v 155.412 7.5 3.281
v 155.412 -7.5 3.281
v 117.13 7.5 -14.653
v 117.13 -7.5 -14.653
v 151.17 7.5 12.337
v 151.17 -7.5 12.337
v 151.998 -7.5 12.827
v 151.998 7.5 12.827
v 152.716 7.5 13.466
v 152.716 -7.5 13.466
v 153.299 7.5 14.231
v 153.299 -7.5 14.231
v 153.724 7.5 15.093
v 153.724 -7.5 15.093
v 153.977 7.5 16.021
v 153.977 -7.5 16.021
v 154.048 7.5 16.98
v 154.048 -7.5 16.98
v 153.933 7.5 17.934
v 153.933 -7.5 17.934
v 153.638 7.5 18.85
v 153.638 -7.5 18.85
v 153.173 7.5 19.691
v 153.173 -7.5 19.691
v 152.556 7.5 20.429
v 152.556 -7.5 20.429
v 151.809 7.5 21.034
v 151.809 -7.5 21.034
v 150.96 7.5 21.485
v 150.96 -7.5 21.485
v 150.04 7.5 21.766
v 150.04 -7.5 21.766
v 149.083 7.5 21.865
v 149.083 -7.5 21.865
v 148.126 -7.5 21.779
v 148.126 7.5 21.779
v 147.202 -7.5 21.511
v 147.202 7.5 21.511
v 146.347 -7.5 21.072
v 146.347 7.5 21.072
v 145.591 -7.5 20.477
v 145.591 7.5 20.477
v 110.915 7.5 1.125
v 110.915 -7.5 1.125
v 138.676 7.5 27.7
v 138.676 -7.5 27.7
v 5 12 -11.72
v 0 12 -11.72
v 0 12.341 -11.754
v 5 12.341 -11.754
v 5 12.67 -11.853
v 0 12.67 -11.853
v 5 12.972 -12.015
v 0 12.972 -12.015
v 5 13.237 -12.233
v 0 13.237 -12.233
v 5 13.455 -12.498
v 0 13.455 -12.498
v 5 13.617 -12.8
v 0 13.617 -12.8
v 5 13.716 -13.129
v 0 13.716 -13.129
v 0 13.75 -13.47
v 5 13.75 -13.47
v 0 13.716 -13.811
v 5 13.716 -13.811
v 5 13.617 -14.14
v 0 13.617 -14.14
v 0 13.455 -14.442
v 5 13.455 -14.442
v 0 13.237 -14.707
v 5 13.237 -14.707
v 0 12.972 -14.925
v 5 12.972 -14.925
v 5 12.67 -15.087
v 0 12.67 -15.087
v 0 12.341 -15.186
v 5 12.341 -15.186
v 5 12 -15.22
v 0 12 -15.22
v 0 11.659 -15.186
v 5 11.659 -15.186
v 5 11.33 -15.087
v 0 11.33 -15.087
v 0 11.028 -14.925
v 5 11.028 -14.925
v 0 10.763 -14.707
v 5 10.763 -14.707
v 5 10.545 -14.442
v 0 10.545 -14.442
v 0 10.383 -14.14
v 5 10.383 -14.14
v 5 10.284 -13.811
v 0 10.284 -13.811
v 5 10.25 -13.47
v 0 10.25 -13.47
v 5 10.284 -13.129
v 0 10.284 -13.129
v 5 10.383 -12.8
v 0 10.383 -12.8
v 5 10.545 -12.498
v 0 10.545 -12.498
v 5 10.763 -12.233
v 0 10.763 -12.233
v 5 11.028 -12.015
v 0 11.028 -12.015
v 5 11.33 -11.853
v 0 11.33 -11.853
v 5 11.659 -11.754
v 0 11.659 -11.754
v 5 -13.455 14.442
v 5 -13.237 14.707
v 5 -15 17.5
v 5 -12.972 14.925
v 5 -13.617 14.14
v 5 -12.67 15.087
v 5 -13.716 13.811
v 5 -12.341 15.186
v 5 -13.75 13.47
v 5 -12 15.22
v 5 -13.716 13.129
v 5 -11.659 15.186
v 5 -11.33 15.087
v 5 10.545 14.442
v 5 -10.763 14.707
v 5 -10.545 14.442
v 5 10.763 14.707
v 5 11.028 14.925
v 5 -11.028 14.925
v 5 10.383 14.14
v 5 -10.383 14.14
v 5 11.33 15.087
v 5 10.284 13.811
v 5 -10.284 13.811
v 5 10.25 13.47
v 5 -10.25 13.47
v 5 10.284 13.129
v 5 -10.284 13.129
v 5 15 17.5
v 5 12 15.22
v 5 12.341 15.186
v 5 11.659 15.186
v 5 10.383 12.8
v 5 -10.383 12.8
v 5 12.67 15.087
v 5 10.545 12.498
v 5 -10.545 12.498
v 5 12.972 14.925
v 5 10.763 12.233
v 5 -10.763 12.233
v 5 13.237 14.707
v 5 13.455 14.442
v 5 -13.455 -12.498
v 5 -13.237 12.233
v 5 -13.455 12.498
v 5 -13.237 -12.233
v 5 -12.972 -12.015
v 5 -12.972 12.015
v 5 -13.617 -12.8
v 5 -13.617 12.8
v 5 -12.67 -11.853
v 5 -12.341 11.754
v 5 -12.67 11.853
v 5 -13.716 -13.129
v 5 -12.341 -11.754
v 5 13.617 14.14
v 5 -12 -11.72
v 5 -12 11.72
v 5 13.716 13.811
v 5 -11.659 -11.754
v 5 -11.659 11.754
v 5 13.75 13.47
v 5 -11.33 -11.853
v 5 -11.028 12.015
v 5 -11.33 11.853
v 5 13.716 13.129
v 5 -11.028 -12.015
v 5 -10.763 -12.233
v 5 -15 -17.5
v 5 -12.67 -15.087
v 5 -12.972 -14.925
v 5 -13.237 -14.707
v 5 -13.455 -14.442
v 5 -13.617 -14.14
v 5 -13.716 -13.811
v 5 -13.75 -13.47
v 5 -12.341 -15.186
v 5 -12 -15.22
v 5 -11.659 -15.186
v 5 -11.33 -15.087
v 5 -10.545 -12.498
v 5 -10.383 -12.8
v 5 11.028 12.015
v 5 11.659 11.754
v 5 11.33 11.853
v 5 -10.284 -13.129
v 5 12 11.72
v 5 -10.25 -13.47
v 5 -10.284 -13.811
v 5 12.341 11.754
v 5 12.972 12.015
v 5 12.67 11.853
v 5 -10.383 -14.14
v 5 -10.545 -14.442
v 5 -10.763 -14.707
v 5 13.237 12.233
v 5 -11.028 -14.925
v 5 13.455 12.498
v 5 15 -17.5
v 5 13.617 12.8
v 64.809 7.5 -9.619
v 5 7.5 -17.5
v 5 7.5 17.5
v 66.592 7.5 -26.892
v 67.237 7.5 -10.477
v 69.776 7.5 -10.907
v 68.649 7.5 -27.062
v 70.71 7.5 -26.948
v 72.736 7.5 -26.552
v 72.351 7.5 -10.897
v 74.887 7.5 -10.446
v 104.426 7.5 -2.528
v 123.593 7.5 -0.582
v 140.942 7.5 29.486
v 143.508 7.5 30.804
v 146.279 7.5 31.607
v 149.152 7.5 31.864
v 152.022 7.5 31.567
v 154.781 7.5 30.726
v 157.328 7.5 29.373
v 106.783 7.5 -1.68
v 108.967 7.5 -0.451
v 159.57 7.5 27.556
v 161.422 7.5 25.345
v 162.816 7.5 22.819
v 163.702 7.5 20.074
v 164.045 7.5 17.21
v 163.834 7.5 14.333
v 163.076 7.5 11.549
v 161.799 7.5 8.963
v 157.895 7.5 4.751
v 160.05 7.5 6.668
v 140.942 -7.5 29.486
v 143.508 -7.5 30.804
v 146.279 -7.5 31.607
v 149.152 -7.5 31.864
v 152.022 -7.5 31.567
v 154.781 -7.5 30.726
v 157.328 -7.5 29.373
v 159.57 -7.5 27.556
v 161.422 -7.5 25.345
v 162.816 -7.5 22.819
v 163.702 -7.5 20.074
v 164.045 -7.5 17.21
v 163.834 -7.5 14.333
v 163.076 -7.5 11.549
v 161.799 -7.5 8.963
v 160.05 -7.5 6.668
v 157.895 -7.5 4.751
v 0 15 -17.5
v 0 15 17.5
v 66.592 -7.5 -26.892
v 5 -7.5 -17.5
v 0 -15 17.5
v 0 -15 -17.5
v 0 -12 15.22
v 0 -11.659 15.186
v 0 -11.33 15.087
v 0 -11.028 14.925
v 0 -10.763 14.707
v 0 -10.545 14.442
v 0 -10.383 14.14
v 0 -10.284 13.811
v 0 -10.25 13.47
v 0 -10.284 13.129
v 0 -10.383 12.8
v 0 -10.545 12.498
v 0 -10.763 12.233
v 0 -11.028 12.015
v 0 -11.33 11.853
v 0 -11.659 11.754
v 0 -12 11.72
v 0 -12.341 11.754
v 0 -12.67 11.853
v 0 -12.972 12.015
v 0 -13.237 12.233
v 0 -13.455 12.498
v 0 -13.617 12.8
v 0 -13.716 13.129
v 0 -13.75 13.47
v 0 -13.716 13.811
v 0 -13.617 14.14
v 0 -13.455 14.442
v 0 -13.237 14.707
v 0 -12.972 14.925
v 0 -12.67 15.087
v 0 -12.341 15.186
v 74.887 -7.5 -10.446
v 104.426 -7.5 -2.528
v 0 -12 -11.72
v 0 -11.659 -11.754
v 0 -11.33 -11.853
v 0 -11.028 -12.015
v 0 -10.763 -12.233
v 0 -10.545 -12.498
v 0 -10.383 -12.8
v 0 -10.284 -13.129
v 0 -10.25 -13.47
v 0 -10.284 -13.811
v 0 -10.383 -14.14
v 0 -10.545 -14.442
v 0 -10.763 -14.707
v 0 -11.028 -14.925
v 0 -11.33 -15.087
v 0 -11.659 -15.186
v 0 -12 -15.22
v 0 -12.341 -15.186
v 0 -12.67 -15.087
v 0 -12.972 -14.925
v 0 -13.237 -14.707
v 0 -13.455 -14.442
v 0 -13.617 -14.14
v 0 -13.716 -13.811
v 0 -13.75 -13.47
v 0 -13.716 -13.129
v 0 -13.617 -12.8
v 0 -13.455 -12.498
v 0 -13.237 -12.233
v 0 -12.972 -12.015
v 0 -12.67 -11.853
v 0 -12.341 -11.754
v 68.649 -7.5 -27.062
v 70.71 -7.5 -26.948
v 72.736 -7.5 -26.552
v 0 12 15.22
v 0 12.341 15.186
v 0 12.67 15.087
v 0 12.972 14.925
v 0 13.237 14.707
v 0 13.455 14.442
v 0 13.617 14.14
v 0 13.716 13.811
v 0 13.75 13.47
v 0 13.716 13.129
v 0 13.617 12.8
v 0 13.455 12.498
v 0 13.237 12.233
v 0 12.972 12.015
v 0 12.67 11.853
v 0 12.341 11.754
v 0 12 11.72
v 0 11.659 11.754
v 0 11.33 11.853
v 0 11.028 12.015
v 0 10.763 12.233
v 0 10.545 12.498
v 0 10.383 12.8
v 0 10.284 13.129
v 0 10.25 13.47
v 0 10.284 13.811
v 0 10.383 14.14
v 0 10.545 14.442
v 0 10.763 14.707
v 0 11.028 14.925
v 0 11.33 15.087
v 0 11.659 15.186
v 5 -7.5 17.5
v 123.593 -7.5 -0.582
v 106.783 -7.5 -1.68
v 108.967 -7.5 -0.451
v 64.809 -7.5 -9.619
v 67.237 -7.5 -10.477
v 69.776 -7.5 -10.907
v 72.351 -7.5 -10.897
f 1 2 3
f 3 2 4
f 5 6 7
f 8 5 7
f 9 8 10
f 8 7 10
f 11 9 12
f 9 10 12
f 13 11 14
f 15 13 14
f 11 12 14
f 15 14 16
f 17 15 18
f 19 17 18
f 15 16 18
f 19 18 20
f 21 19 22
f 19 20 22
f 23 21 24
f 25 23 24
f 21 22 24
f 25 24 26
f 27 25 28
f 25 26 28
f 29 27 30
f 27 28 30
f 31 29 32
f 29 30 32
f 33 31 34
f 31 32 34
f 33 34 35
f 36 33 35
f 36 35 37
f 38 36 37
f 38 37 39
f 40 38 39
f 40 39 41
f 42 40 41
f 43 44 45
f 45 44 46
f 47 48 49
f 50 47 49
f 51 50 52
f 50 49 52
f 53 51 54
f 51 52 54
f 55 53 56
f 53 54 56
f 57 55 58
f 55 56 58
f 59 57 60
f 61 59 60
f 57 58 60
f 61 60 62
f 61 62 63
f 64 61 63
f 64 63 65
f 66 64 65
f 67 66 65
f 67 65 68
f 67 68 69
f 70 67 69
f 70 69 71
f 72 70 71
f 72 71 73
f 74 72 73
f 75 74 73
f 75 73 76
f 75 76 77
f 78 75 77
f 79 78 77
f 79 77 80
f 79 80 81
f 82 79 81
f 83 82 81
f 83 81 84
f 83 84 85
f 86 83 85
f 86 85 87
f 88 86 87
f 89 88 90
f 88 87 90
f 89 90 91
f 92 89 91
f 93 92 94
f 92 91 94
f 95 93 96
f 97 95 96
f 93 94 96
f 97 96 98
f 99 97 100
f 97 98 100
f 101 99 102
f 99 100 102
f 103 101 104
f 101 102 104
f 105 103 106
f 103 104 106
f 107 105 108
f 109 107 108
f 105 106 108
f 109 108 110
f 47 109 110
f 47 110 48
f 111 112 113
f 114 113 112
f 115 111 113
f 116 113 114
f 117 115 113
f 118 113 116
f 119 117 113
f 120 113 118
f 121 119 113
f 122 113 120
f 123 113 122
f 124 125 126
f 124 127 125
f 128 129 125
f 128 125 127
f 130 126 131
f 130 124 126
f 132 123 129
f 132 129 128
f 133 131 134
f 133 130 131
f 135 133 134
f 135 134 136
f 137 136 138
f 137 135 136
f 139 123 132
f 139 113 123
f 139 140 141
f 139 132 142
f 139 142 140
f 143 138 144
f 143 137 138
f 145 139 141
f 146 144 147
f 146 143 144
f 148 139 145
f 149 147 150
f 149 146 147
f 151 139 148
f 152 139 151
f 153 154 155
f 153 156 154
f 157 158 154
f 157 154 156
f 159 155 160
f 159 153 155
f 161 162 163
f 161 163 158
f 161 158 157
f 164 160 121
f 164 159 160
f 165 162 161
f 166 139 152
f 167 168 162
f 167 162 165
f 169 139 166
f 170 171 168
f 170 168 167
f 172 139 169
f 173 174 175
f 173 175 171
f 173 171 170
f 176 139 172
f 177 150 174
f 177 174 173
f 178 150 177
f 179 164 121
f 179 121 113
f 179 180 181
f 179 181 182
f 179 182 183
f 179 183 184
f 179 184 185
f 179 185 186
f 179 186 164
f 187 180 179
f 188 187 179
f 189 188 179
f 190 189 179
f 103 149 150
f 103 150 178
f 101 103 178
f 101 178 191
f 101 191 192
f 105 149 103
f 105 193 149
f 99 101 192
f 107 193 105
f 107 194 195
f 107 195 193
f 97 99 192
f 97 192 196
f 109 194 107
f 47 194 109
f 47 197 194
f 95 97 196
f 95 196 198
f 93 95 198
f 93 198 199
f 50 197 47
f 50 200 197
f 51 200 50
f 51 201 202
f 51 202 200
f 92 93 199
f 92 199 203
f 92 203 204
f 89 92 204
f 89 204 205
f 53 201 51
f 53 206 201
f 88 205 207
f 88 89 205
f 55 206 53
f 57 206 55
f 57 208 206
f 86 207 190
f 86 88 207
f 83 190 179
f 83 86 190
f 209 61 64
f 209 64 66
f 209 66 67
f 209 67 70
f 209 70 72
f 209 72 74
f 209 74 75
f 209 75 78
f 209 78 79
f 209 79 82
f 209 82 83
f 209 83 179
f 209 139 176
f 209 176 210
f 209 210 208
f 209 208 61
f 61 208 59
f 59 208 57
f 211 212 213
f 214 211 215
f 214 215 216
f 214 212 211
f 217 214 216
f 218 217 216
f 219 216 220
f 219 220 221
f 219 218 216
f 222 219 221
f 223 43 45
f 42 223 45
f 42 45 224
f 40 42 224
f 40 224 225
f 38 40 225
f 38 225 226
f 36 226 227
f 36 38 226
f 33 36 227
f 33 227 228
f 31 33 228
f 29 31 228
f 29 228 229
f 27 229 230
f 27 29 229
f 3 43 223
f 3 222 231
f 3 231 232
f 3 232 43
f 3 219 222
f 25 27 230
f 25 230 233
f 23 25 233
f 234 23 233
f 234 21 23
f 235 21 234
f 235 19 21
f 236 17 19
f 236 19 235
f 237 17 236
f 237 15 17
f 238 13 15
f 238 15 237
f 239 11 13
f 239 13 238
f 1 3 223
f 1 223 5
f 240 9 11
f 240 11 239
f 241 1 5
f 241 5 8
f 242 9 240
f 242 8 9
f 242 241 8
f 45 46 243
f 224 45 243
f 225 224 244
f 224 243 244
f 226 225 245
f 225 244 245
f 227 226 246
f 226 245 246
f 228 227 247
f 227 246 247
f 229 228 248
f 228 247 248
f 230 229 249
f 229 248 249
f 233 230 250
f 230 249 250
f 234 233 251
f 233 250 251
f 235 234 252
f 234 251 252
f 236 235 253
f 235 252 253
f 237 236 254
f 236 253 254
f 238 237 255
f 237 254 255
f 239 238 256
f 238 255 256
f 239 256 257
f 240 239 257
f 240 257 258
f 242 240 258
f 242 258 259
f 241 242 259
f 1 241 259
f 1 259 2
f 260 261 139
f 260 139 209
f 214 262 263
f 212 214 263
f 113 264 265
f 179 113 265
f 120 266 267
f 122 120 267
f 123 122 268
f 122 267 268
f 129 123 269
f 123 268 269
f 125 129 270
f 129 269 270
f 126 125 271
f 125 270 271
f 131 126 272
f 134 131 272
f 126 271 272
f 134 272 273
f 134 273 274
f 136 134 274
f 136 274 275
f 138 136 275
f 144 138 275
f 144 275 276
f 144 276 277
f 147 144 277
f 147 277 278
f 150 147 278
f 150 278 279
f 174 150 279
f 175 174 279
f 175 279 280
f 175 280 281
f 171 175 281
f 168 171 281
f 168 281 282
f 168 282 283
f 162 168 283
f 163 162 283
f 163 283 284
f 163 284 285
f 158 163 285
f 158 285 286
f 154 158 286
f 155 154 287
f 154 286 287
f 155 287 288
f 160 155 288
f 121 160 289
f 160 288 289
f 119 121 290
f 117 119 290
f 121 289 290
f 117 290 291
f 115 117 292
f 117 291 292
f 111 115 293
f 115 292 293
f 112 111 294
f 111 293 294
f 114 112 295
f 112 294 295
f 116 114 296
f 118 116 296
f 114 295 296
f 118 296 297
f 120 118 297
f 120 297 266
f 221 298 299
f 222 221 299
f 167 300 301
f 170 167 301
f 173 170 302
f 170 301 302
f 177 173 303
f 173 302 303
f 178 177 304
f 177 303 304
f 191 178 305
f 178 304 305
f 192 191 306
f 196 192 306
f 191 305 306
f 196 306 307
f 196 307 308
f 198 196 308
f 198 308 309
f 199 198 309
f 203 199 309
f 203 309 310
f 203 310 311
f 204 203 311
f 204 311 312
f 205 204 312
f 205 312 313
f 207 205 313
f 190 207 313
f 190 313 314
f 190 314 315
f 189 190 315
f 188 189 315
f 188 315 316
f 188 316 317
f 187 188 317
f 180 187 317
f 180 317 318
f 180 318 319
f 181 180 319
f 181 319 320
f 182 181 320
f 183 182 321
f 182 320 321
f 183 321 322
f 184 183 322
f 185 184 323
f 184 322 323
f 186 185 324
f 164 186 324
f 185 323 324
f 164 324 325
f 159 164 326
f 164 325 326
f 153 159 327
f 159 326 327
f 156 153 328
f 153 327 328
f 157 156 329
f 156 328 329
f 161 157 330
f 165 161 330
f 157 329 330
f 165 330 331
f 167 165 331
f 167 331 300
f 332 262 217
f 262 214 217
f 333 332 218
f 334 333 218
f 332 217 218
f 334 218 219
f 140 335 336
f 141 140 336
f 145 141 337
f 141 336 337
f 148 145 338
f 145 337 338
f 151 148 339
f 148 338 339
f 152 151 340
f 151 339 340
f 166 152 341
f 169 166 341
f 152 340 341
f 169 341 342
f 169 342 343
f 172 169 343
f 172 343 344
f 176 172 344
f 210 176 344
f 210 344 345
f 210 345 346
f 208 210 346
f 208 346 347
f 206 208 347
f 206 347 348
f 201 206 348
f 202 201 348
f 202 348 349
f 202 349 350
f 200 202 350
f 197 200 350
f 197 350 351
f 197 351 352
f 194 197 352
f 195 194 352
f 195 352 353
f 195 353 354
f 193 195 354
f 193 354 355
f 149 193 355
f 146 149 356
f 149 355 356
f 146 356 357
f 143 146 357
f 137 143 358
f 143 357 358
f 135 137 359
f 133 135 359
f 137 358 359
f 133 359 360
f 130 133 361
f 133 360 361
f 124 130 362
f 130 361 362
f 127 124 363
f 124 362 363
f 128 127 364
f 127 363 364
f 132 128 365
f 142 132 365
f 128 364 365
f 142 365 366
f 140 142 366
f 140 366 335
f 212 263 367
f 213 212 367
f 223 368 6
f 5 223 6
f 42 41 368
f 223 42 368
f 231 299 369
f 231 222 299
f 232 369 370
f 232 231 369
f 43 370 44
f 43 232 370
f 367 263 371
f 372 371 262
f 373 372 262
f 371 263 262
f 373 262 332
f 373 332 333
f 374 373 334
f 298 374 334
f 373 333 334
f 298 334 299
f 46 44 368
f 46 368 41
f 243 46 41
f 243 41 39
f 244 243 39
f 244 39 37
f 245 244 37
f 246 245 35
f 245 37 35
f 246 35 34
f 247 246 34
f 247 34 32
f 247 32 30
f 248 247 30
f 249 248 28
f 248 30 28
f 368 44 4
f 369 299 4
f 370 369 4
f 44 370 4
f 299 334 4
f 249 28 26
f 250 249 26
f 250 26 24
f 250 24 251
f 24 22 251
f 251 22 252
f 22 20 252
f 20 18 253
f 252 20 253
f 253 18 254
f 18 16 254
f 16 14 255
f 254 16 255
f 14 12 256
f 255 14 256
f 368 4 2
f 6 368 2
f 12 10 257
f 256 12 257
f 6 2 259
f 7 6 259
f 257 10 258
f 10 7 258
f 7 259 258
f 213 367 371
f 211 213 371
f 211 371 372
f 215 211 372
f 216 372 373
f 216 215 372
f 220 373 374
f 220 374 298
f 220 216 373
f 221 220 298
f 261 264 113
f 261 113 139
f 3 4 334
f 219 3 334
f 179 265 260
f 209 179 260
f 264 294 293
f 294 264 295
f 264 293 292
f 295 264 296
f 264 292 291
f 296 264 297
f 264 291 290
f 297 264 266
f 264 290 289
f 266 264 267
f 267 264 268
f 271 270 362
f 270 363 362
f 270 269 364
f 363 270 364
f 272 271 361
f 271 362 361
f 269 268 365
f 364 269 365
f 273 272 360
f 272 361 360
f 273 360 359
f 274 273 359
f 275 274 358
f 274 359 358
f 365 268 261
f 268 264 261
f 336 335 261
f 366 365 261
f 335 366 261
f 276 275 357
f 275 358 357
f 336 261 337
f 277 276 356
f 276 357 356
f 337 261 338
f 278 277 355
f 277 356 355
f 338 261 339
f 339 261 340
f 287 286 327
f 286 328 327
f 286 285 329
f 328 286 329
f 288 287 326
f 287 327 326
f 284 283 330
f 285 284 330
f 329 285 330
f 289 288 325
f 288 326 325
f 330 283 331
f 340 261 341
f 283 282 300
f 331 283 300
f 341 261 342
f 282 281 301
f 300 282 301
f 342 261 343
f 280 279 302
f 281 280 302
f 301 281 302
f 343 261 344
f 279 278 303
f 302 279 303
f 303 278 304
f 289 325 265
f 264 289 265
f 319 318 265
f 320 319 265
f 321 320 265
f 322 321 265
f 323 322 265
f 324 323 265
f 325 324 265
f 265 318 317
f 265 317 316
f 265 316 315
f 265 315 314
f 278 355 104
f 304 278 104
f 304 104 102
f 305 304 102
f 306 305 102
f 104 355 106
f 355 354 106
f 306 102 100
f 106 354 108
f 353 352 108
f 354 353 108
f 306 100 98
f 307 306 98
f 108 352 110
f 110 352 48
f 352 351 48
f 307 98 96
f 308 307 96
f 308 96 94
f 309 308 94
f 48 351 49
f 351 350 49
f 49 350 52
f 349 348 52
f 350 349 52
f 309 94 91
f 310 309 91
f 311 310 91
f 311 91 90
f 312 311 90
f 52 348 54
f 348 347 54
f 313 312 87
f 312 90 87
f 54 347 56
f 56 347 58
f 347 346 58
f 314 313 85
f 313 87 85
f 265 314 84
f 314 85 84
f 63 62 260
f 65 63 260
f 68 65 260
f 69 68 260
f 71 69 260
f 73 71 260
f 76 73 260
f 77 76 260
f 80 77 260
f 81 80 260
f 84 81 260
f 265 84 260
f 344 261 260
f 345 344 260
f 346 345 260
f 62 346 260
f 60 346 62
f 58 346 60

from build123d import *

# Parameters (mm, degrees)
SKETCH1_W           = 35
SKETCH1_H           = 30
BOSS_EXTRUDE1_DEPTH = 5
EXTRUDE_THIN1_START = -7.5
EXTRUDE_THIN1_DEPTH = 15
FILLET1_R           = 15
SKETCH3_R           = 1.75
CUT_EXTRUDE1_DEPTH  = 15


# Read off the part's stored shape, not the designer's step: Extrude-Thin1
with BuildPart() as part:
    # Sketch1 → Boss-Extrude1 (new body)
    with BuildSketch(Plane(origin=(0, 0, 0), x_dir=(0, 0, -1), z_dir=(1, 0, 0))):
        Rectangle(SKETCH1_W, SKETCH1_H)
    extrude(amount=BOSS_EXTRUDE1_DEPTH)

    # Sketch3 → Cut-Extrude1 (cut)
    with BuildSketch(Plane.ZY):
        with Locations((-13.47, 12)):
            Circle(SKETCH3_R)
        with Locations((-13.47, -12)):
            Circle(SKETCH3_R)
        with Locations((13.47, -12)):
            Circle(SKETCH3_R)
        with Locations((13.47, 12)):
            Circle(SKETCH3_R)
    extrude(amount=-CUT_EXTRUDE1_DEPTH, mode=Mode.SUBTRACT)


with BuildPart() as body_2:
    # Extrude-Thin1 outline → Extrude-Thin1 (new body)
    with BuildSketch(Plane(origin=(0, 0, 0), x_dir=(1, 0, 0), z_dir=(0, 1, 0)).offset(EXTRUDE_THIN1_START)):
        with BuildLine():
            Line((5, 17.5), (5, -17.5))
            Line((5, -17.5), (69.699704629, 11.836309819))
            Line((69.699704629, 11.836309819), (108.138274173, 1.533178197))
            Line((108.138274173, 1.533178197), (138.676277548, -27.700290017))
            ThreePointArc((138.676277548, -27.700290017), (161.421833774, -25.344805337), (155.412254056, -3.281406058))
            Line((155.412254056, -3.281406058), (117.129901337, 14.652550121))
            Line((117.129901337, 14.652550121), (69.699704629, 27.365810926))
            Line((69.699704629, 27.365810926), (5, 17.5))
        make_face()
        with BuildLine():
            ThreePointArc((151.170028648, -12.336985752), (153.173221887, -19.691452178), (145.591369812, -20.476613738))
            Line((145.591369812, -20.476613738), (123.593252888, 0.581778455))
            Line((123.593252888, 0.581778455), (151.170028648, -12.336985752))
        make_face(mode=Mode.SUBTRACT)
    extrude(amount=EXTRUDE_THIN1_DEPTH)

    # Fillet1
    fillet1_edges = [body_2.edges().sort_by_distance(p)[0] for p in [
        (69.699704629, 0, -27.365810926),
        (108.138274173, 0, -1.533178197),
        (69.699704629, 0, -11.836309819),
    ]]
    fillet(fillet1_edges, radius=FILLET1_R)


solid = Compound([part.part, body_2.part])
